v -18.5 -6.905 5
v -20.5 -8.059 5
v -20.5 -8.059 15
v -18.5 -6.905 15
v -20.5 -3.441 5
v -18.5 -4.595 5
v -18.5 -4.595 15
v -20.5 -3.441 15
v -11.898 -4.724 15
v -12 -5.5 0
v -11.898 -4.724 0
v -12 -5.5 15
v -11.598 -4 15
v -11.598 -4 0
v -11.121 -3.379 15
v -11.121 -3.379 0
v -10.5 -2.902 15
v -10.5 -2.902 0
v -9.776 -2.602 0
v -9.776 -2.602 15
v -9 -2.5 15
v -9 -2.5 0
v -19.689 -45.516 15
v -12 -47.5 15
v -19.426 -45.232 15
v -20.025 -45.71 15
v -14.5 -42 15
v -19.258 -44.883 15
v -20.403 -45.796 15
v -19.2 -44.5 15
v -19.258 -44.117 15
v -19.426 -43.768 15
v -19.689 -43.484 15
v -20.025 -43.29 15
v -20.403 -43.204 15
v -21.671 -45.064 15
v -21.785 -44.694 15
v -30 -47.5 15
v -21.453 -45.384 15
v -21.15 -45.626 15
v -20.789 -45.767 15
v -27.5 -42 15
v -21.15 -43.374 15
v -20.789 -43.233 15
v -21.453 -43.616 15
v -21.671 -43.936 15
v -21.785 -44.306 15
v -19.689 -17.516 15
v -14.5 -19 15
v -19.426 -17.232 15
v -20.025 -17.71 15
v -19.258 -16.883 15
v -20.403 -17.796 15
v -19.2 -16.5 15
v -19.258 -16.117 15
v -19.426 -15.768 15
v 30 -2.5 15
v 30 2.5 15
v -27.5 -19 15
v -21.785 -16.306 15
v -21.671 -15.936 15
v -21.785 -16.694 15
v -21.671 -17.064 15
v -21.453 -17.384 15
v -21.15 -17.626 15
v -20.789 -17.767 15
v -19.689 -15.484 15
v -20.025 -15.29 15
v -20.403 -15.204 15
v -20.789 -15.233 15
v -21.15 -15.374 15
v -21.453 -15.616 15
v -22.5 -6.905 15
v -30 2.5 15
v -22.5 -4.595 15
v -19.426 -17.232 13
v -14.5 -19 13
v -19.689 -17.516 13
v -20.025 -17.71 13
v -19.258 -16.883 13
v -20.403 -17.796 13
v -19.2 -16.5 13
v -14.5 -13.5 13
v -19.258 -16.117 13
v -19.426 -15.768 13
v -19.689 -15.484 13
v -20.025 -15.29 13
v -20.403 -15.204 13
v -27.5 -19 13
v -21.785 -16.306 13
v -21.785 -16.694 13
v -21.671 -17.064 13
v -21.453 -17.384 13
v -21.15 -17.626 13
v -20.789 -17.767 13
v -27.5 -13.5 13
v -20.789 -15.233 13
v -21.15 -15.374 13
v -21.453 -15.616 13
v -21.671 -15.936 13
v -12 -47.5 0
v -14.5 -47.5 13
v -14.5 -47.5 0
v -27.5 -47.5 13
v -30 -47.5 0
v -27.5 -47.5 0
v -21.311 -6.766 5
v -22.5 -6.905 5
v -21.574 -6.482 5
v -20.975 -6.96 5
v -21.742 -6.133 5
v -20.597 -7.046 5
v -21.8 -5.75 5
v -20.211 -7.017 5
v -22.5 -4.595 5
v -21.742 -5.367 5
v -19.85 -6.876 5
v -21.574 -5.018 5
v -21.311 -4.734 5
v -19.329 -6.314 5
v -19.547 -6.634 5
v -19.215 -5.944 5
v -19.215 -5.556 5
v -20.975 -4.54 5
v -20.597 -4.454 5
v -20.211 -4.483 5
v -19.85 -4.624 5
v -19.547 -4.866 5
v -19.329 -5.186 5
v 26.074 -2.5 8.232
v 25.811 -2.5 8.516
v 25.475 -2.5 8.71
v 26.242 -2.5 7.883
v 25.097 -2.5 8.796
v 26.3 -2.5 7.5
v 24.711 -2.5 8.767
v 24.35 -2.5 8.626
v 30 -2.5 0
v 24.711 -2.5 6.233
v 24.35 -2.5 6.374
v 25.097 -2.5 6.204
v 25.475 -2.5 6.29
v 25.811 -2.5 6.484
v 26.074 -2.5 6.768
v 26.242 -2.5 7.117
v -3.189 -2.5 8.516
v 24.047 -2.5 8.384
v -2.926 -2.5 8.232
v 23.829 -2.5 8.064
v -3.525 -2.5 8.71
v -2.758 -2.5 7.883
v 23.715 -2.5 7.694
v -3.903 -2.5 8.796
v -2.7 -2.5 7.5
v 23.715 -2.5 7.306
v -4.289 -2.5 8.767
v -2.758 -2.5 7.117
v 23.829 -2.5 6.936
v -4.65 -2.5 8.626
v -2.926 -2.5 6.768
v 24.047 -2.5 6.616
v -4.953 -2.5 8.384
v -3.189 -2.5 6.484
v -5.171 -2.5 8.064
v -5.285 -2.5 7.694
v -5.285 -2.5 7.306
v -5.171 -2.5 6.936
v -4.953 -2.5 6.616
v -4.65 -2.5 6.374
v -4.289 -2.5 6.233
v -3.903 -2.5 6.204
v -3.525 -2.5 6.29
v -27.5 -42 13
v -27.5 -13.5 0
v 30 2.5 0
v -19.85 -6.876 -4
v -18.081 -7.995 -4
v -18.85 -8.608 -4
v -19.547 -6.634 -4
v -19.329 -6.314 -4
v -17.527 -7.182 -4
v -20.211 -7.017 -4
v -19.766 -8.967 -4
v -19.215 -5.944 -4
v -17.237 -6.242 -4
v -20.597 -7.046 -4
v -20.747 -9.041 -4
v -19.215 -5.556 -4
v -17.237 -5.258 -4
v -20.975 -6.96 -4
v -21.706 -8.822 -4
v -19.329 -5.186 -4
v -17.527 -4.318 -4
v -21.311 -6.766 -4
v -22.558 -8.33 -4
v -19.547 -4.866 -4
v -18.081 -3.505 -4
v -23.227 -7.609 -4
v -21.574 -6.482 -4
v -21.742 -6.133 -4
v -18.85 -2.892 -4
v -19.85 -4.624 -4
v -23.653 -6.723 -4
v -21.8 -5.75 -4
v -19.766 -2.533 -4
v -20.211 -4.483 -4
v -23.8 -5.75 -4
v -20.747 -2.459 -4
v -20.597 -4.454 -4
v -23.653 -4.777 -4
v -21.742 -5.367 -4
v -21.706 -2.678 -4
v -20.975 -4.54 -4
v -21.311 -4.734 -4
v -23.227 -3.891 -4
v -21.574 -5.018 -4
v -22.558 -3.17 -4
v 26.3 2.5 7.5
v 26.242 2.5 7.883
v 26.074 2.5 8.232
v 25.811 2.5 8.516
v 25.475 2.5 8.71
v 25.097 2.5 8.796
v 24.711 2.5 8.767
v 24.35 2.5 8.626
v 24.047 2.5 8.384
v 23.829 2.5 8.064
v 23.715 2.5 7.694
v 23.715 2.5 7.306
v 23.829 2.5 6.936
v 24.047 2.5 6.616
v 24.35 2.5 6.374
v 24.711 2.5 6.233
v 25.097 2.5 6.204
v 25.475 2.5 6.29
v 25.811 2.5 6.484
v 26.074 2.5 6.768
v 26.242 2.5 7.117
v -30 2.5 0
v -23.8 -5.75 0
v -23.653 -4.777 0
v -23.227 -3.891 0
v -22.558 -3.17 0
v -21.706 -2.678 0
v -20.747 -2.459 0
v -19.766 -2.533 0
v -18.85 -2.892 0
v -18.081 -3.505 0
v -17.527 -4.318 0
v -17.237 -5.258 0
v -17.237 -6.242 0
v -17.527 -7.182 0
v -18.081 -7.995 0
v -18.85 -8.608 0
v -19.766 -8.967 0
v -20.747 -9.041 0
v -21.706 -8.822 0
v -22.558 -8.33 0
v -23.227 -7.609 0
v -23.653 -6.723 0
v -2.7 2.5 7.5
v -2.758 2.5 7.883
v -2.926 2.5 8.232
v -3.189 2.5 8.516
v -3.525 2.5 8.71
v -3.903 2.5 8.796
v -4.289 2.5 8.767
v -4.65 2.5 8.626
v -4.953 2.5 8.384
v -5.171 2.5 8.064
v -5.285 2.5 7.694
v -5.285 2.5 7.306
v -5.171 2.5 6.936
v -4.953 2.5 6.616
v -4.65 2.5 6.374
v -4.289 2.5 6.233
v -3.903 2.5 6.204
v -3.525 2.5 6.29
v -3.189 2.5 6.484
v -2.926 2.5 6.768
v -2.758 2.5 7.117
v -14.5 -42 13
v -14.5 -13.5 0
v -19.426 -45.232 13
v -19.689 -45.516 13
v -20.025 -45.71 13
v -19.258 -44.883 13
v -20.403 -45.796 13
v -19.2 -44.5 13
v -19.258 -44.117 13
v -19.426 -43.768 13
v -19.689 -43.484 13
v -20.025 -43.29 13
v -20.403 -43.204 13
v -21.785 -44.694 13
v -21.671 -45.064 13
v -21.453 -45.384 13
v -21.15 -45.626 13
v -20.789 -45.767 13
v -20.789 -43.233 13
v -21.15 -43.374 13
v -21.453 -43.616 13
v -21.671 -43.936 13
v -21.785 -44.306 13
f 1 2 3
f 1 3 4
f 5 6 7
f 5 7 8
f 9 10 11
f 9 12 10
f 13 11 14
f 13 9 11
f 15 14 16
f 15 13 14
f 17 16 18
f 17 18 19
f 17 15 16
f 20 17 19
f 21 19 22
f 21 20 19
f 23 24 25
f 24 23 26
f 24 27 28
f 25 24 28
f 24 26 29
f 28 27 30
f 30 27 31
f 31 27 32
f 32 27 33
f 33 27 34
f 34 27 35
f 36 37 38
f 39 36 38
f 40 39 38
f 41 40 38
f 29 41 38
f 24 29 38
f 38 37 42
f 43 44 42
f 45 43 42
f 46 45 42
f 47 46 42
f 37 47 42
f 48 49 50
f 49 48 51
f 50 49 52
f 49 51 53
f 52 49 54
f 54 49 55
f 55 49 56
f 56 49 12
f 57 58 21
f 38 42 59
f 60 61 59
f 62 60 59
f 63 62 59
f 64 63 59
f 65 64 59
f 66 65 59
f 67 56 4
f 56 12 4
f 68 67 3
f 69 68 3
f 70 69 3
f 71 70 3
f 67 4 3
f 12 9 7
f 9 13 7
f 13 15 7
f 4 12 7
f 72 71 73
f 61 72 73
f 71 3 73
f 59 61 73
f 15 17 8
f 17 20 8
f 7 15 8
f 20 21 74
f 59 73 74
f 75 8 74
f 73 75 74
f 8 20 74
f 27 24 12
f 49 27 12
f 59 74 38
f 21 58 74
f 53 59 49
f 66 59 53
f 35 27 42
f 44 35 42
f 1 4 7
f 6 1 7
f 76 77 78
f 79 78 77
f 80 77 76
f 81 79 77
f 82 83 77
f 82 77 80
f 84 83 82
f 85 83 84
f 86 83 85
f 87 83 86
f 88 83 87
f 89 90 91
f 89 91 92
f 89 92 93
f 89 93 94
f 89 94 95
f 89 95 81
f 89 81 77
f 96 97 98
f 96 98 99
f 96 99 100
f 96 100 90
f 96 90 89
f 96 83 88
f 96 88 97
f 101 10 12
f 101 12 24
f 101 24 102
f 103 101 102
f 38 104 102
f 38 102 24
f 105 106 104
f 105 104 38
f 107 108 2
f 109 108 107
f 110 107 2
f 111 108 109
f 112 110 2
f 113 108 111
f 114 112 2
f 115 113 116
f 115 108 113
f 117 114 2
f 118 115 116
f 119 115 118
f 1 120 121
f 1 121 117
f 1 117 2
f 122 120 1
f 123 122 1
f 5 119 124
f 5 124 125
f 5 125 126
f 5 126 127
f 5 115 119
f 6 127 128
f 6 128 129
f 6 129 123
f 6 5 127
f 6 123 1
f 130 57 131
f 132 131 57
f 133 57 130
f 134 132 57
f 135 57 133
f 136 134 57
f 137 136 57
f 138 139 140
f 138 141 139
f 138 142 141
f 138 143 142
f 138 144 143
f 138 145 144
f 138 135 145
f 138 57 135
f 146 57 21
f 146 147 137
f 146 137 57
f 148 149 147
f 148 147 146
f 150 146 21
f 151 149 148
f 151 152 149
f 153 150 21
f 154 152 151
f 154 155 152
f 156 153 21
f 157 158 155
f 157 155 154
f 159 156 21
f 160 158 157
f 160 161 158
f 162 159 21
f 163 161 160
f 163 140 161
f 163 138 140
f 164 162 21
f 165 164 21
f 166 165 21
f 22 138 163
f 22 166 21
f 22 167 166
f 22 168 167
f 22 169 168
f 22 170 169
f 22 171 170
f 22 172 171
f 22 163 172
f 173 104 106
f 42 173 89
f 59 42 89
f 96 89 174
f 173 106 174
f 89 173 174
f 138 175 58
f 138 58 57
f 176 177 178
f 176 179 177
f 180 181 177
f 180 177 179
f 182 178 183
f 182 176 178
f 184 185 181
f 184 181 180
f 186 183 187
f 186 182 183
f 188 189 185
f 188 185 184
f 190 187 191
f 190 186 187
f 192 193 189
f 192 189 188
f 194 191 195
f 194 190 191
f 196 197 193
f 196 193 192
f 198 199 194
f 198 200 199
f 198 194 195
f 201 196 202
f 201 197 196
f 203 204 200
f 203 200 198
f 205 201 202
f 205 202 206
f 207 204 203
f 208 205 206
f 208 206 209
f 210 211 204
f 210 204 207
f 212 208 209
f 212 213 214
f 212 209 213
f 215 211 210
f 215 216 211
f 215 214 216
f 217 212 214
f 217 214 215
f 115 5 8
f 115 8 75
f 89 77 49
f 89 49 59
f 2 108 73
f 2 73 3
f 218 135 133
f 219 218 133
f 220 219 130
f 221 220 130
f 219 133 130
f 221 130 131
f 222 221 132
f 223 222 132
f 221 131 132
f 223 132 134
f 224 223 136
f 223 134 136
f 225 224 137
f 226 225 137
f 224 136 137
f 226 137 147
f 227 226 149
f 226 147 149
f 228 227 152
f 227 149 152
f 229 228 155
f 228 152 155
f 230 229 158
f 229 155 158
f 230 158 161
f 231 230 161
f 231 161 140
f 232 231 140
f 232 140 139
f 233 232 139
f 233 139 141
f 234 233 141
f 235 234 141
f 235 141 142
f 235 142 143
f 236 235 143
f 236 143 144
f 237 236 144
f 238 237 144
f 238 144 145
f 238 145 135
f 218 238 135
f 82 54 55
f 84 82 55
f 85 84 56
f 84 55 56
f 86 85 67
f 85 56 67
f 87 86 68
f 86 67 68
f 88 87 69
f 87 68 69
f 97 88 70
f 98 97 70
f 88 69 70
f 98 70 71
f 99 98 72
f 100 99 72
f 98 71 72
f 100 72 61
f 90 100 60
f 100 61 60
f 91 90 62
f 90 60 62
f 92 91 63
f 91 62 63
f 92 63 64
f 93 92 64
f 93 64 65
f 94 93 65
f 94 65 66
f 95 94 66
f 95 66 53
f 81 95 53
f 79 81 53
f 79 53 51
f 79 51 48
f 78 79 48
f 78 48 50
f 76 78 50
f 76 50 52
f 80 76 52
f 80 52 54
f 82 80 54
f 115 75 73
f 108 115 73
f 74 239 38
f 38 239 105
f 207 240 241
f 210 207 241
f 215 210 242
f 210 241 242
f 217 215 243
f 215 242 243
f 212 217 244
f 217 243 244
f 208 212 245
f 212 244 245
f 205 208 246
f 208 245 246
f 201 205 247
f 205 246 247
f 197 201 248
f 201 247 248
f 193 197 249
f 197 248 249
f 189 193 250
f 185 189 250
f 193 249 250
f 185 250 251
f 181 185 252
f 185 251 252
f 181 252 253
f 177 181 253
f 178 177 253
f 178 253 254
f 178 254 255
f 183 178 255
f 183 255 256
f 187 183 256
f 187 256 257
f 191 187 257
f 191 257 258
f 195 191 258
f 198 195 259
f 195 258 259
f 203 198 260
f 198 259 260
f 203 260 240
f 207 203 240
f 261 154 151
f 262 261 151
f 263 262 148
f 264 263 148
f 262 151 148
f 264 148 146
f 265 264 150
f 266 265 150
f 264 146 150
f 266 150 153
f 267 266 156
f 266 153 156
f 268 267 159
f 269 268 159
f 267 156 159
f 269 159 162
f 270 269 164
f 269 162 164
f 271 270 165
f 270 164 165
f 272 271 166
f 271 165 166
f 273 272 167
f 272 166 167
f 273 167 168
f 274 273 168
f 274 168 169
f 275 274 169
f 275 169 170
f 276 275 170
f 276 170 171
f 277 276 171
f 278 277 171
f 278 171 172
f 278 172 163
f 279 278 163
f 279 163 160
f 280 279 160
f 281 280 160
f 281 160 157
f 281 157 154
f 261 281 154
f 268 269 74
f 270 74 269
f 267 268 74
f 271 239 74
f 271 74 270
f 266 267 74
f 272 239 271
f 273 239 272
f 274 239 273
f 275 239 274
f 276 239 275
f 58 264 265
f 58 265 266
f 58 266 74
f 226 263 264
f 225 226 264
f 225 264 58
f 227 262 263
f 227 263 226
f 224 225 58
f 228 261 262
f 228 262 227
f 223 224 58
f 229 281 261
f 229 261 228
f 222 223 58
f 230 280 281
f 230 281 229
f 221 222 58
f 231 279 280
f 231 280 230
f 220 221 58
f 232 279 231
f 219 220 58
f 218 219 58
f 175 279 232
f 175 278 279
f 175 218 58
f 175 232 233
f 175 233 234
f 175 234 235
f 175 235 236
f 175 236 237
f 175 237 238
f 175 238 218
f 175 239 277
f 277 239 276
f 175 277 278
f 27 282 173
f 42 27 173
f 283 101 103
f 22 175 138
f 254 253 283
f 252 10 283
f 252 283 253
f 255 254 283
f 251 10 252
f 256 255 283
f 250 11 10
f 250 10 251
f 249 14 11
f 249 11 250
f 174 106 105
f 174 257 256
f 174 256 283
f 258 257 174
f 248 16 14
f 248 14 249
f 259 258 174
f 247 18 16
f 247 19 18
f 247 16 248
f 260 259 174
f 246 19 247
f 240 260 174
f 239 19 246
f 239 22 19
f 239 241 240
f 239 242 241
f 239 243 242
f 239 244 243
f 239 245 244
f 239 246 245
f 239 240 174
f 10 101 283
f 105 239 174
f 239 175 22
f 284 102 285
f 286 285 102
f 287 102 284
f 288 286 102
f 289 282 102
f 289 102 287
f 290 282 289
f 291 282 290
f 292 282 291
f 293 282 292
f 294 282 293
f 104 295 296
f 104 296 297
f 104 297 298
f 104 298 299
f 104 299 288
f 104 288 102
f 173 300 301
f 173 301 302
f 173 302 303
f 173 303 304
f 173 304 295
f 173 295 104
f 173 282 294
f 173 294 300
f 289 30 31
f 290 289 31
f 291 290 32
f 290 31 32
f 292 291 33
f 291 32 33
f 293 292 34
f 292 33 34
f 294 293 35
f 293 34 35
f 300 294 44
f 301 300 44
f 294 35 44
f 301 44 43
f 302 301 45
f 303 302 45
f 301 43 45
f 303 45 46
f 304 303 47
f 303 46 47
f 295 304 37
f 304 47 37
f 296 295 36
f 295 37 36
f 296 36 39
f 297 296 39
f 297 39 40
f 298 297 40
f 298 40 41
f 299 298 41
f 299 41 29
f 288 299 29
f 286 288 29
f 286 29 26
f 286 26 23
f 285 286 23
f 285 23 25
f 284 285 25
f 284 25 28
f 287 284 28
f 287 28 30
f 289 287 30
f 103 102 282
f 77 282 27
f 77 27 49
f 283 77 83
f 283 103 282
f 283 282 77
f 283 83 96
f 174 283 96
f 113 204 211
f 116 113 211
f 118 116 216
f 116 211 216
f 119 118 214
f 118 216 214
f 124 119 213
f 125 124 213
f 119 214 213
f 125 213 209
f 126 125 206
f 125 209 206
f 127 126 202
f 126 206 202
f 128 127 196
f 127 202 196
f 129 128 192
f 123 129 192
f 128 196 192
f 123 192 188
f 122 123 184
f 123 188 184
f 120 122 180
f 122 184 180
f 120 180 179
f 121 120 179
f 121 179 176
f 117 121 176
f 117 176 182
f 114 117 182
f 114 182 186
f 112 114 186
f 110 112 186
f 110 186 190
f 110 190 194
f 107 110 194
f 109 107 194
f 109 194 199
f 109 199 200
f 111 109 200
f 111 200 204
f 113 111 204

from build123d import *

# Parameters (mm, degrees)
DODANIE_WYCI_GNI_CIE1_DEPTH = 15
OTW_R_POD_RUB_M21_D         = 2.6
OTW_R_POD_RUB_M21_DEPTH     = 5
SZKIC7_W                    = 13
SZKIC7_H                    = 34
WYTNIJ_WYCI_GNI_CIE2_DEPTH  = 13
WYTNIJ_WYCI_GNI_CIE3_REACH  = 4
SZKIC8_W                    = 13
SZKIC8_H                    = 23
OTW_R_POD_RUB_M22_D         = 2.6
OTW_R_POD_RUB_M22_DEPTH     = 2
SZKIC13_R                   = 3.3
DODANIE_WYCI_GNI_CIE2_DEPTH = 4
WYTNIJ_WYCI_GNI_CIE4_REACH  = 21
SZKIC11_R                   = 1.3
WYTNIJ_WYCI_GNI_CIE5_DEPTH  = 10
ZAOKR_GLENIE1_R             = 3


with BuildPart() as part:
    # Szkic1 → Dodanie-wyciągnięcie1 (new body)
    with BuildSketch(Plane.XY):
        Polygon((-30, -2.5), (-30, 2.5), (30, 2.5), (30, -2.5), (-12, -2.5), (-12, -47.5), (-30, -47.5), align=None)
    extrude(amount=DODANIE_WYCI_GNI_CIE1_DEPTH)

    # Otwór pod śrubę M21
    with Locations(Plane(origin=(0, 2.5, 0), x_dir=(-1, 0, 0), z_dir=(0, 1, 0))):
        with Locations((-25, 7.5), (4, 7.5)):
            Hole(OTW_R_POD_RUB_M21_D / 2, depth=OTW_R_POD_RUB_M21_DEPTH)

    # Szkic7 → Wytnij-wyciągnięcie2 (cut)
    with BuildSketch(Plane(origin=(0, 0, 0), x_dir=(-1, 0, 0), z_dir=(0, 0, -1))):
        with Locations((21, -30.5)):
            Rectangle(SZKIC7_W, SZKIC7_H)
    extrude(amount=-WYTNIJ_WYCI_GNI_CIE2_DEPTH, mode=Mode.SUBTRACT)

    # Szkic8 → Wytnij-wyciągnięcie3 (cut, up to next)
    with BuildSketch(Plane(origin=(0, 0, 13), x_dir=(-1, 0, 0), z_dir=(0, 0, -1)), mode=Mode.PRIVATE) as wytnij_wyci_gni_cie3_sk1:
        with Locations((21, -30.5)):
            Rectangle(SZKIC8_W, SZKIC8_H)
    wytnij_wyci_gni_cie3_tool1 = extrude(wytnij_wyci_gni_cie3_sk1.sketch, amount=-WYTNIJ_WYCI_GNI_CIE3_REACH, mode=Mode.PRIVATE) & part.part
    add(wytnij_wyci_gni_cie3_tool1.solids().sort_by_distance((-21, -30.5, 13))[0], mode=Mode.SUBTRACT)

    # Otwór pod śrubę M22
    with Locations(Plane(origin=(0, 0, 13), x_dir=(-1, 0, 0), z_dir=(0, 0, -1))):
        with Locations((20.5, -16.5), (20.5, -44.5)):
            Hole(OTW_R_POD_RUB_M22_D / 2, depth=OTW_R_POD_RUB_M22_DEPTH)

    # Szkic13 → Dodanie-wyciągnięcie2 (add)
    with BuildSketch(Plane(origin=(0, 0, 0), x_dir=(-1, 0, 0), z_dir=(0, 0, -1))):
        with Locations((20.5, -5.75)):
            Circle(SZKIC13_R)
    extrude(amount=DODANIE_WYCI_GNI_CIE2_DEPTH)

    # Szkic11 → Wytnij-wyciągnięcie4 (cut, up to next)
    with BuildSketch(Plane(origin=(0, 0, -4), x_dir=(-1, 0, 0), z_dir=(0, 0, -1)), mode=Mode.PRIVATE) as wytnij_wyci_gni_cie4_sk1:
        with Locations((20.5, -5.75)):
            Circle(SZKIC11_R)
    wytnij_wyci_gni_cie4_tool1 = extrude(wytnij_wyci_gni_cie4_sk1.sketch, amount=-WYTNIJ_WYCI_GNI_CIE4_REACH, mode=Mode.PRIVATE) & part.part
    add(wytnij_wyci_gni_cie4_tool1.solids().sort_by_distance((-20.5, -5.75, -4))[0], mode=Mode.SUBTRACT)

    # Szkic12 → Wytnij-wyciągnięcie5 (cut)
    with BuildSketch(Plane.XY.offset(15)):
        Polygon((-18.5, -6.904700538), (-18.5, -4.595299462), (-20.5, -3.440598923), (-22.5, -4.595299462), (-22.5, -6.904700538), (-20.5, -8.059401077), align=None)
    extrude(amount=-WYTNIJ_WYCI_GNI_CIE5_DEPTH, mode=Mode.SUBTRACT)

    # Zaokrąglenie1
    zaokr_glenie1_edges = [part.edges().sort_by_distance(p)[0] for p in [
        (-12, -2.5, 7.5),
    ]]
    fillet(zaokr_glenie1_edges, radius=ZAOKR_GLENIE1_R)


solid = part.part
